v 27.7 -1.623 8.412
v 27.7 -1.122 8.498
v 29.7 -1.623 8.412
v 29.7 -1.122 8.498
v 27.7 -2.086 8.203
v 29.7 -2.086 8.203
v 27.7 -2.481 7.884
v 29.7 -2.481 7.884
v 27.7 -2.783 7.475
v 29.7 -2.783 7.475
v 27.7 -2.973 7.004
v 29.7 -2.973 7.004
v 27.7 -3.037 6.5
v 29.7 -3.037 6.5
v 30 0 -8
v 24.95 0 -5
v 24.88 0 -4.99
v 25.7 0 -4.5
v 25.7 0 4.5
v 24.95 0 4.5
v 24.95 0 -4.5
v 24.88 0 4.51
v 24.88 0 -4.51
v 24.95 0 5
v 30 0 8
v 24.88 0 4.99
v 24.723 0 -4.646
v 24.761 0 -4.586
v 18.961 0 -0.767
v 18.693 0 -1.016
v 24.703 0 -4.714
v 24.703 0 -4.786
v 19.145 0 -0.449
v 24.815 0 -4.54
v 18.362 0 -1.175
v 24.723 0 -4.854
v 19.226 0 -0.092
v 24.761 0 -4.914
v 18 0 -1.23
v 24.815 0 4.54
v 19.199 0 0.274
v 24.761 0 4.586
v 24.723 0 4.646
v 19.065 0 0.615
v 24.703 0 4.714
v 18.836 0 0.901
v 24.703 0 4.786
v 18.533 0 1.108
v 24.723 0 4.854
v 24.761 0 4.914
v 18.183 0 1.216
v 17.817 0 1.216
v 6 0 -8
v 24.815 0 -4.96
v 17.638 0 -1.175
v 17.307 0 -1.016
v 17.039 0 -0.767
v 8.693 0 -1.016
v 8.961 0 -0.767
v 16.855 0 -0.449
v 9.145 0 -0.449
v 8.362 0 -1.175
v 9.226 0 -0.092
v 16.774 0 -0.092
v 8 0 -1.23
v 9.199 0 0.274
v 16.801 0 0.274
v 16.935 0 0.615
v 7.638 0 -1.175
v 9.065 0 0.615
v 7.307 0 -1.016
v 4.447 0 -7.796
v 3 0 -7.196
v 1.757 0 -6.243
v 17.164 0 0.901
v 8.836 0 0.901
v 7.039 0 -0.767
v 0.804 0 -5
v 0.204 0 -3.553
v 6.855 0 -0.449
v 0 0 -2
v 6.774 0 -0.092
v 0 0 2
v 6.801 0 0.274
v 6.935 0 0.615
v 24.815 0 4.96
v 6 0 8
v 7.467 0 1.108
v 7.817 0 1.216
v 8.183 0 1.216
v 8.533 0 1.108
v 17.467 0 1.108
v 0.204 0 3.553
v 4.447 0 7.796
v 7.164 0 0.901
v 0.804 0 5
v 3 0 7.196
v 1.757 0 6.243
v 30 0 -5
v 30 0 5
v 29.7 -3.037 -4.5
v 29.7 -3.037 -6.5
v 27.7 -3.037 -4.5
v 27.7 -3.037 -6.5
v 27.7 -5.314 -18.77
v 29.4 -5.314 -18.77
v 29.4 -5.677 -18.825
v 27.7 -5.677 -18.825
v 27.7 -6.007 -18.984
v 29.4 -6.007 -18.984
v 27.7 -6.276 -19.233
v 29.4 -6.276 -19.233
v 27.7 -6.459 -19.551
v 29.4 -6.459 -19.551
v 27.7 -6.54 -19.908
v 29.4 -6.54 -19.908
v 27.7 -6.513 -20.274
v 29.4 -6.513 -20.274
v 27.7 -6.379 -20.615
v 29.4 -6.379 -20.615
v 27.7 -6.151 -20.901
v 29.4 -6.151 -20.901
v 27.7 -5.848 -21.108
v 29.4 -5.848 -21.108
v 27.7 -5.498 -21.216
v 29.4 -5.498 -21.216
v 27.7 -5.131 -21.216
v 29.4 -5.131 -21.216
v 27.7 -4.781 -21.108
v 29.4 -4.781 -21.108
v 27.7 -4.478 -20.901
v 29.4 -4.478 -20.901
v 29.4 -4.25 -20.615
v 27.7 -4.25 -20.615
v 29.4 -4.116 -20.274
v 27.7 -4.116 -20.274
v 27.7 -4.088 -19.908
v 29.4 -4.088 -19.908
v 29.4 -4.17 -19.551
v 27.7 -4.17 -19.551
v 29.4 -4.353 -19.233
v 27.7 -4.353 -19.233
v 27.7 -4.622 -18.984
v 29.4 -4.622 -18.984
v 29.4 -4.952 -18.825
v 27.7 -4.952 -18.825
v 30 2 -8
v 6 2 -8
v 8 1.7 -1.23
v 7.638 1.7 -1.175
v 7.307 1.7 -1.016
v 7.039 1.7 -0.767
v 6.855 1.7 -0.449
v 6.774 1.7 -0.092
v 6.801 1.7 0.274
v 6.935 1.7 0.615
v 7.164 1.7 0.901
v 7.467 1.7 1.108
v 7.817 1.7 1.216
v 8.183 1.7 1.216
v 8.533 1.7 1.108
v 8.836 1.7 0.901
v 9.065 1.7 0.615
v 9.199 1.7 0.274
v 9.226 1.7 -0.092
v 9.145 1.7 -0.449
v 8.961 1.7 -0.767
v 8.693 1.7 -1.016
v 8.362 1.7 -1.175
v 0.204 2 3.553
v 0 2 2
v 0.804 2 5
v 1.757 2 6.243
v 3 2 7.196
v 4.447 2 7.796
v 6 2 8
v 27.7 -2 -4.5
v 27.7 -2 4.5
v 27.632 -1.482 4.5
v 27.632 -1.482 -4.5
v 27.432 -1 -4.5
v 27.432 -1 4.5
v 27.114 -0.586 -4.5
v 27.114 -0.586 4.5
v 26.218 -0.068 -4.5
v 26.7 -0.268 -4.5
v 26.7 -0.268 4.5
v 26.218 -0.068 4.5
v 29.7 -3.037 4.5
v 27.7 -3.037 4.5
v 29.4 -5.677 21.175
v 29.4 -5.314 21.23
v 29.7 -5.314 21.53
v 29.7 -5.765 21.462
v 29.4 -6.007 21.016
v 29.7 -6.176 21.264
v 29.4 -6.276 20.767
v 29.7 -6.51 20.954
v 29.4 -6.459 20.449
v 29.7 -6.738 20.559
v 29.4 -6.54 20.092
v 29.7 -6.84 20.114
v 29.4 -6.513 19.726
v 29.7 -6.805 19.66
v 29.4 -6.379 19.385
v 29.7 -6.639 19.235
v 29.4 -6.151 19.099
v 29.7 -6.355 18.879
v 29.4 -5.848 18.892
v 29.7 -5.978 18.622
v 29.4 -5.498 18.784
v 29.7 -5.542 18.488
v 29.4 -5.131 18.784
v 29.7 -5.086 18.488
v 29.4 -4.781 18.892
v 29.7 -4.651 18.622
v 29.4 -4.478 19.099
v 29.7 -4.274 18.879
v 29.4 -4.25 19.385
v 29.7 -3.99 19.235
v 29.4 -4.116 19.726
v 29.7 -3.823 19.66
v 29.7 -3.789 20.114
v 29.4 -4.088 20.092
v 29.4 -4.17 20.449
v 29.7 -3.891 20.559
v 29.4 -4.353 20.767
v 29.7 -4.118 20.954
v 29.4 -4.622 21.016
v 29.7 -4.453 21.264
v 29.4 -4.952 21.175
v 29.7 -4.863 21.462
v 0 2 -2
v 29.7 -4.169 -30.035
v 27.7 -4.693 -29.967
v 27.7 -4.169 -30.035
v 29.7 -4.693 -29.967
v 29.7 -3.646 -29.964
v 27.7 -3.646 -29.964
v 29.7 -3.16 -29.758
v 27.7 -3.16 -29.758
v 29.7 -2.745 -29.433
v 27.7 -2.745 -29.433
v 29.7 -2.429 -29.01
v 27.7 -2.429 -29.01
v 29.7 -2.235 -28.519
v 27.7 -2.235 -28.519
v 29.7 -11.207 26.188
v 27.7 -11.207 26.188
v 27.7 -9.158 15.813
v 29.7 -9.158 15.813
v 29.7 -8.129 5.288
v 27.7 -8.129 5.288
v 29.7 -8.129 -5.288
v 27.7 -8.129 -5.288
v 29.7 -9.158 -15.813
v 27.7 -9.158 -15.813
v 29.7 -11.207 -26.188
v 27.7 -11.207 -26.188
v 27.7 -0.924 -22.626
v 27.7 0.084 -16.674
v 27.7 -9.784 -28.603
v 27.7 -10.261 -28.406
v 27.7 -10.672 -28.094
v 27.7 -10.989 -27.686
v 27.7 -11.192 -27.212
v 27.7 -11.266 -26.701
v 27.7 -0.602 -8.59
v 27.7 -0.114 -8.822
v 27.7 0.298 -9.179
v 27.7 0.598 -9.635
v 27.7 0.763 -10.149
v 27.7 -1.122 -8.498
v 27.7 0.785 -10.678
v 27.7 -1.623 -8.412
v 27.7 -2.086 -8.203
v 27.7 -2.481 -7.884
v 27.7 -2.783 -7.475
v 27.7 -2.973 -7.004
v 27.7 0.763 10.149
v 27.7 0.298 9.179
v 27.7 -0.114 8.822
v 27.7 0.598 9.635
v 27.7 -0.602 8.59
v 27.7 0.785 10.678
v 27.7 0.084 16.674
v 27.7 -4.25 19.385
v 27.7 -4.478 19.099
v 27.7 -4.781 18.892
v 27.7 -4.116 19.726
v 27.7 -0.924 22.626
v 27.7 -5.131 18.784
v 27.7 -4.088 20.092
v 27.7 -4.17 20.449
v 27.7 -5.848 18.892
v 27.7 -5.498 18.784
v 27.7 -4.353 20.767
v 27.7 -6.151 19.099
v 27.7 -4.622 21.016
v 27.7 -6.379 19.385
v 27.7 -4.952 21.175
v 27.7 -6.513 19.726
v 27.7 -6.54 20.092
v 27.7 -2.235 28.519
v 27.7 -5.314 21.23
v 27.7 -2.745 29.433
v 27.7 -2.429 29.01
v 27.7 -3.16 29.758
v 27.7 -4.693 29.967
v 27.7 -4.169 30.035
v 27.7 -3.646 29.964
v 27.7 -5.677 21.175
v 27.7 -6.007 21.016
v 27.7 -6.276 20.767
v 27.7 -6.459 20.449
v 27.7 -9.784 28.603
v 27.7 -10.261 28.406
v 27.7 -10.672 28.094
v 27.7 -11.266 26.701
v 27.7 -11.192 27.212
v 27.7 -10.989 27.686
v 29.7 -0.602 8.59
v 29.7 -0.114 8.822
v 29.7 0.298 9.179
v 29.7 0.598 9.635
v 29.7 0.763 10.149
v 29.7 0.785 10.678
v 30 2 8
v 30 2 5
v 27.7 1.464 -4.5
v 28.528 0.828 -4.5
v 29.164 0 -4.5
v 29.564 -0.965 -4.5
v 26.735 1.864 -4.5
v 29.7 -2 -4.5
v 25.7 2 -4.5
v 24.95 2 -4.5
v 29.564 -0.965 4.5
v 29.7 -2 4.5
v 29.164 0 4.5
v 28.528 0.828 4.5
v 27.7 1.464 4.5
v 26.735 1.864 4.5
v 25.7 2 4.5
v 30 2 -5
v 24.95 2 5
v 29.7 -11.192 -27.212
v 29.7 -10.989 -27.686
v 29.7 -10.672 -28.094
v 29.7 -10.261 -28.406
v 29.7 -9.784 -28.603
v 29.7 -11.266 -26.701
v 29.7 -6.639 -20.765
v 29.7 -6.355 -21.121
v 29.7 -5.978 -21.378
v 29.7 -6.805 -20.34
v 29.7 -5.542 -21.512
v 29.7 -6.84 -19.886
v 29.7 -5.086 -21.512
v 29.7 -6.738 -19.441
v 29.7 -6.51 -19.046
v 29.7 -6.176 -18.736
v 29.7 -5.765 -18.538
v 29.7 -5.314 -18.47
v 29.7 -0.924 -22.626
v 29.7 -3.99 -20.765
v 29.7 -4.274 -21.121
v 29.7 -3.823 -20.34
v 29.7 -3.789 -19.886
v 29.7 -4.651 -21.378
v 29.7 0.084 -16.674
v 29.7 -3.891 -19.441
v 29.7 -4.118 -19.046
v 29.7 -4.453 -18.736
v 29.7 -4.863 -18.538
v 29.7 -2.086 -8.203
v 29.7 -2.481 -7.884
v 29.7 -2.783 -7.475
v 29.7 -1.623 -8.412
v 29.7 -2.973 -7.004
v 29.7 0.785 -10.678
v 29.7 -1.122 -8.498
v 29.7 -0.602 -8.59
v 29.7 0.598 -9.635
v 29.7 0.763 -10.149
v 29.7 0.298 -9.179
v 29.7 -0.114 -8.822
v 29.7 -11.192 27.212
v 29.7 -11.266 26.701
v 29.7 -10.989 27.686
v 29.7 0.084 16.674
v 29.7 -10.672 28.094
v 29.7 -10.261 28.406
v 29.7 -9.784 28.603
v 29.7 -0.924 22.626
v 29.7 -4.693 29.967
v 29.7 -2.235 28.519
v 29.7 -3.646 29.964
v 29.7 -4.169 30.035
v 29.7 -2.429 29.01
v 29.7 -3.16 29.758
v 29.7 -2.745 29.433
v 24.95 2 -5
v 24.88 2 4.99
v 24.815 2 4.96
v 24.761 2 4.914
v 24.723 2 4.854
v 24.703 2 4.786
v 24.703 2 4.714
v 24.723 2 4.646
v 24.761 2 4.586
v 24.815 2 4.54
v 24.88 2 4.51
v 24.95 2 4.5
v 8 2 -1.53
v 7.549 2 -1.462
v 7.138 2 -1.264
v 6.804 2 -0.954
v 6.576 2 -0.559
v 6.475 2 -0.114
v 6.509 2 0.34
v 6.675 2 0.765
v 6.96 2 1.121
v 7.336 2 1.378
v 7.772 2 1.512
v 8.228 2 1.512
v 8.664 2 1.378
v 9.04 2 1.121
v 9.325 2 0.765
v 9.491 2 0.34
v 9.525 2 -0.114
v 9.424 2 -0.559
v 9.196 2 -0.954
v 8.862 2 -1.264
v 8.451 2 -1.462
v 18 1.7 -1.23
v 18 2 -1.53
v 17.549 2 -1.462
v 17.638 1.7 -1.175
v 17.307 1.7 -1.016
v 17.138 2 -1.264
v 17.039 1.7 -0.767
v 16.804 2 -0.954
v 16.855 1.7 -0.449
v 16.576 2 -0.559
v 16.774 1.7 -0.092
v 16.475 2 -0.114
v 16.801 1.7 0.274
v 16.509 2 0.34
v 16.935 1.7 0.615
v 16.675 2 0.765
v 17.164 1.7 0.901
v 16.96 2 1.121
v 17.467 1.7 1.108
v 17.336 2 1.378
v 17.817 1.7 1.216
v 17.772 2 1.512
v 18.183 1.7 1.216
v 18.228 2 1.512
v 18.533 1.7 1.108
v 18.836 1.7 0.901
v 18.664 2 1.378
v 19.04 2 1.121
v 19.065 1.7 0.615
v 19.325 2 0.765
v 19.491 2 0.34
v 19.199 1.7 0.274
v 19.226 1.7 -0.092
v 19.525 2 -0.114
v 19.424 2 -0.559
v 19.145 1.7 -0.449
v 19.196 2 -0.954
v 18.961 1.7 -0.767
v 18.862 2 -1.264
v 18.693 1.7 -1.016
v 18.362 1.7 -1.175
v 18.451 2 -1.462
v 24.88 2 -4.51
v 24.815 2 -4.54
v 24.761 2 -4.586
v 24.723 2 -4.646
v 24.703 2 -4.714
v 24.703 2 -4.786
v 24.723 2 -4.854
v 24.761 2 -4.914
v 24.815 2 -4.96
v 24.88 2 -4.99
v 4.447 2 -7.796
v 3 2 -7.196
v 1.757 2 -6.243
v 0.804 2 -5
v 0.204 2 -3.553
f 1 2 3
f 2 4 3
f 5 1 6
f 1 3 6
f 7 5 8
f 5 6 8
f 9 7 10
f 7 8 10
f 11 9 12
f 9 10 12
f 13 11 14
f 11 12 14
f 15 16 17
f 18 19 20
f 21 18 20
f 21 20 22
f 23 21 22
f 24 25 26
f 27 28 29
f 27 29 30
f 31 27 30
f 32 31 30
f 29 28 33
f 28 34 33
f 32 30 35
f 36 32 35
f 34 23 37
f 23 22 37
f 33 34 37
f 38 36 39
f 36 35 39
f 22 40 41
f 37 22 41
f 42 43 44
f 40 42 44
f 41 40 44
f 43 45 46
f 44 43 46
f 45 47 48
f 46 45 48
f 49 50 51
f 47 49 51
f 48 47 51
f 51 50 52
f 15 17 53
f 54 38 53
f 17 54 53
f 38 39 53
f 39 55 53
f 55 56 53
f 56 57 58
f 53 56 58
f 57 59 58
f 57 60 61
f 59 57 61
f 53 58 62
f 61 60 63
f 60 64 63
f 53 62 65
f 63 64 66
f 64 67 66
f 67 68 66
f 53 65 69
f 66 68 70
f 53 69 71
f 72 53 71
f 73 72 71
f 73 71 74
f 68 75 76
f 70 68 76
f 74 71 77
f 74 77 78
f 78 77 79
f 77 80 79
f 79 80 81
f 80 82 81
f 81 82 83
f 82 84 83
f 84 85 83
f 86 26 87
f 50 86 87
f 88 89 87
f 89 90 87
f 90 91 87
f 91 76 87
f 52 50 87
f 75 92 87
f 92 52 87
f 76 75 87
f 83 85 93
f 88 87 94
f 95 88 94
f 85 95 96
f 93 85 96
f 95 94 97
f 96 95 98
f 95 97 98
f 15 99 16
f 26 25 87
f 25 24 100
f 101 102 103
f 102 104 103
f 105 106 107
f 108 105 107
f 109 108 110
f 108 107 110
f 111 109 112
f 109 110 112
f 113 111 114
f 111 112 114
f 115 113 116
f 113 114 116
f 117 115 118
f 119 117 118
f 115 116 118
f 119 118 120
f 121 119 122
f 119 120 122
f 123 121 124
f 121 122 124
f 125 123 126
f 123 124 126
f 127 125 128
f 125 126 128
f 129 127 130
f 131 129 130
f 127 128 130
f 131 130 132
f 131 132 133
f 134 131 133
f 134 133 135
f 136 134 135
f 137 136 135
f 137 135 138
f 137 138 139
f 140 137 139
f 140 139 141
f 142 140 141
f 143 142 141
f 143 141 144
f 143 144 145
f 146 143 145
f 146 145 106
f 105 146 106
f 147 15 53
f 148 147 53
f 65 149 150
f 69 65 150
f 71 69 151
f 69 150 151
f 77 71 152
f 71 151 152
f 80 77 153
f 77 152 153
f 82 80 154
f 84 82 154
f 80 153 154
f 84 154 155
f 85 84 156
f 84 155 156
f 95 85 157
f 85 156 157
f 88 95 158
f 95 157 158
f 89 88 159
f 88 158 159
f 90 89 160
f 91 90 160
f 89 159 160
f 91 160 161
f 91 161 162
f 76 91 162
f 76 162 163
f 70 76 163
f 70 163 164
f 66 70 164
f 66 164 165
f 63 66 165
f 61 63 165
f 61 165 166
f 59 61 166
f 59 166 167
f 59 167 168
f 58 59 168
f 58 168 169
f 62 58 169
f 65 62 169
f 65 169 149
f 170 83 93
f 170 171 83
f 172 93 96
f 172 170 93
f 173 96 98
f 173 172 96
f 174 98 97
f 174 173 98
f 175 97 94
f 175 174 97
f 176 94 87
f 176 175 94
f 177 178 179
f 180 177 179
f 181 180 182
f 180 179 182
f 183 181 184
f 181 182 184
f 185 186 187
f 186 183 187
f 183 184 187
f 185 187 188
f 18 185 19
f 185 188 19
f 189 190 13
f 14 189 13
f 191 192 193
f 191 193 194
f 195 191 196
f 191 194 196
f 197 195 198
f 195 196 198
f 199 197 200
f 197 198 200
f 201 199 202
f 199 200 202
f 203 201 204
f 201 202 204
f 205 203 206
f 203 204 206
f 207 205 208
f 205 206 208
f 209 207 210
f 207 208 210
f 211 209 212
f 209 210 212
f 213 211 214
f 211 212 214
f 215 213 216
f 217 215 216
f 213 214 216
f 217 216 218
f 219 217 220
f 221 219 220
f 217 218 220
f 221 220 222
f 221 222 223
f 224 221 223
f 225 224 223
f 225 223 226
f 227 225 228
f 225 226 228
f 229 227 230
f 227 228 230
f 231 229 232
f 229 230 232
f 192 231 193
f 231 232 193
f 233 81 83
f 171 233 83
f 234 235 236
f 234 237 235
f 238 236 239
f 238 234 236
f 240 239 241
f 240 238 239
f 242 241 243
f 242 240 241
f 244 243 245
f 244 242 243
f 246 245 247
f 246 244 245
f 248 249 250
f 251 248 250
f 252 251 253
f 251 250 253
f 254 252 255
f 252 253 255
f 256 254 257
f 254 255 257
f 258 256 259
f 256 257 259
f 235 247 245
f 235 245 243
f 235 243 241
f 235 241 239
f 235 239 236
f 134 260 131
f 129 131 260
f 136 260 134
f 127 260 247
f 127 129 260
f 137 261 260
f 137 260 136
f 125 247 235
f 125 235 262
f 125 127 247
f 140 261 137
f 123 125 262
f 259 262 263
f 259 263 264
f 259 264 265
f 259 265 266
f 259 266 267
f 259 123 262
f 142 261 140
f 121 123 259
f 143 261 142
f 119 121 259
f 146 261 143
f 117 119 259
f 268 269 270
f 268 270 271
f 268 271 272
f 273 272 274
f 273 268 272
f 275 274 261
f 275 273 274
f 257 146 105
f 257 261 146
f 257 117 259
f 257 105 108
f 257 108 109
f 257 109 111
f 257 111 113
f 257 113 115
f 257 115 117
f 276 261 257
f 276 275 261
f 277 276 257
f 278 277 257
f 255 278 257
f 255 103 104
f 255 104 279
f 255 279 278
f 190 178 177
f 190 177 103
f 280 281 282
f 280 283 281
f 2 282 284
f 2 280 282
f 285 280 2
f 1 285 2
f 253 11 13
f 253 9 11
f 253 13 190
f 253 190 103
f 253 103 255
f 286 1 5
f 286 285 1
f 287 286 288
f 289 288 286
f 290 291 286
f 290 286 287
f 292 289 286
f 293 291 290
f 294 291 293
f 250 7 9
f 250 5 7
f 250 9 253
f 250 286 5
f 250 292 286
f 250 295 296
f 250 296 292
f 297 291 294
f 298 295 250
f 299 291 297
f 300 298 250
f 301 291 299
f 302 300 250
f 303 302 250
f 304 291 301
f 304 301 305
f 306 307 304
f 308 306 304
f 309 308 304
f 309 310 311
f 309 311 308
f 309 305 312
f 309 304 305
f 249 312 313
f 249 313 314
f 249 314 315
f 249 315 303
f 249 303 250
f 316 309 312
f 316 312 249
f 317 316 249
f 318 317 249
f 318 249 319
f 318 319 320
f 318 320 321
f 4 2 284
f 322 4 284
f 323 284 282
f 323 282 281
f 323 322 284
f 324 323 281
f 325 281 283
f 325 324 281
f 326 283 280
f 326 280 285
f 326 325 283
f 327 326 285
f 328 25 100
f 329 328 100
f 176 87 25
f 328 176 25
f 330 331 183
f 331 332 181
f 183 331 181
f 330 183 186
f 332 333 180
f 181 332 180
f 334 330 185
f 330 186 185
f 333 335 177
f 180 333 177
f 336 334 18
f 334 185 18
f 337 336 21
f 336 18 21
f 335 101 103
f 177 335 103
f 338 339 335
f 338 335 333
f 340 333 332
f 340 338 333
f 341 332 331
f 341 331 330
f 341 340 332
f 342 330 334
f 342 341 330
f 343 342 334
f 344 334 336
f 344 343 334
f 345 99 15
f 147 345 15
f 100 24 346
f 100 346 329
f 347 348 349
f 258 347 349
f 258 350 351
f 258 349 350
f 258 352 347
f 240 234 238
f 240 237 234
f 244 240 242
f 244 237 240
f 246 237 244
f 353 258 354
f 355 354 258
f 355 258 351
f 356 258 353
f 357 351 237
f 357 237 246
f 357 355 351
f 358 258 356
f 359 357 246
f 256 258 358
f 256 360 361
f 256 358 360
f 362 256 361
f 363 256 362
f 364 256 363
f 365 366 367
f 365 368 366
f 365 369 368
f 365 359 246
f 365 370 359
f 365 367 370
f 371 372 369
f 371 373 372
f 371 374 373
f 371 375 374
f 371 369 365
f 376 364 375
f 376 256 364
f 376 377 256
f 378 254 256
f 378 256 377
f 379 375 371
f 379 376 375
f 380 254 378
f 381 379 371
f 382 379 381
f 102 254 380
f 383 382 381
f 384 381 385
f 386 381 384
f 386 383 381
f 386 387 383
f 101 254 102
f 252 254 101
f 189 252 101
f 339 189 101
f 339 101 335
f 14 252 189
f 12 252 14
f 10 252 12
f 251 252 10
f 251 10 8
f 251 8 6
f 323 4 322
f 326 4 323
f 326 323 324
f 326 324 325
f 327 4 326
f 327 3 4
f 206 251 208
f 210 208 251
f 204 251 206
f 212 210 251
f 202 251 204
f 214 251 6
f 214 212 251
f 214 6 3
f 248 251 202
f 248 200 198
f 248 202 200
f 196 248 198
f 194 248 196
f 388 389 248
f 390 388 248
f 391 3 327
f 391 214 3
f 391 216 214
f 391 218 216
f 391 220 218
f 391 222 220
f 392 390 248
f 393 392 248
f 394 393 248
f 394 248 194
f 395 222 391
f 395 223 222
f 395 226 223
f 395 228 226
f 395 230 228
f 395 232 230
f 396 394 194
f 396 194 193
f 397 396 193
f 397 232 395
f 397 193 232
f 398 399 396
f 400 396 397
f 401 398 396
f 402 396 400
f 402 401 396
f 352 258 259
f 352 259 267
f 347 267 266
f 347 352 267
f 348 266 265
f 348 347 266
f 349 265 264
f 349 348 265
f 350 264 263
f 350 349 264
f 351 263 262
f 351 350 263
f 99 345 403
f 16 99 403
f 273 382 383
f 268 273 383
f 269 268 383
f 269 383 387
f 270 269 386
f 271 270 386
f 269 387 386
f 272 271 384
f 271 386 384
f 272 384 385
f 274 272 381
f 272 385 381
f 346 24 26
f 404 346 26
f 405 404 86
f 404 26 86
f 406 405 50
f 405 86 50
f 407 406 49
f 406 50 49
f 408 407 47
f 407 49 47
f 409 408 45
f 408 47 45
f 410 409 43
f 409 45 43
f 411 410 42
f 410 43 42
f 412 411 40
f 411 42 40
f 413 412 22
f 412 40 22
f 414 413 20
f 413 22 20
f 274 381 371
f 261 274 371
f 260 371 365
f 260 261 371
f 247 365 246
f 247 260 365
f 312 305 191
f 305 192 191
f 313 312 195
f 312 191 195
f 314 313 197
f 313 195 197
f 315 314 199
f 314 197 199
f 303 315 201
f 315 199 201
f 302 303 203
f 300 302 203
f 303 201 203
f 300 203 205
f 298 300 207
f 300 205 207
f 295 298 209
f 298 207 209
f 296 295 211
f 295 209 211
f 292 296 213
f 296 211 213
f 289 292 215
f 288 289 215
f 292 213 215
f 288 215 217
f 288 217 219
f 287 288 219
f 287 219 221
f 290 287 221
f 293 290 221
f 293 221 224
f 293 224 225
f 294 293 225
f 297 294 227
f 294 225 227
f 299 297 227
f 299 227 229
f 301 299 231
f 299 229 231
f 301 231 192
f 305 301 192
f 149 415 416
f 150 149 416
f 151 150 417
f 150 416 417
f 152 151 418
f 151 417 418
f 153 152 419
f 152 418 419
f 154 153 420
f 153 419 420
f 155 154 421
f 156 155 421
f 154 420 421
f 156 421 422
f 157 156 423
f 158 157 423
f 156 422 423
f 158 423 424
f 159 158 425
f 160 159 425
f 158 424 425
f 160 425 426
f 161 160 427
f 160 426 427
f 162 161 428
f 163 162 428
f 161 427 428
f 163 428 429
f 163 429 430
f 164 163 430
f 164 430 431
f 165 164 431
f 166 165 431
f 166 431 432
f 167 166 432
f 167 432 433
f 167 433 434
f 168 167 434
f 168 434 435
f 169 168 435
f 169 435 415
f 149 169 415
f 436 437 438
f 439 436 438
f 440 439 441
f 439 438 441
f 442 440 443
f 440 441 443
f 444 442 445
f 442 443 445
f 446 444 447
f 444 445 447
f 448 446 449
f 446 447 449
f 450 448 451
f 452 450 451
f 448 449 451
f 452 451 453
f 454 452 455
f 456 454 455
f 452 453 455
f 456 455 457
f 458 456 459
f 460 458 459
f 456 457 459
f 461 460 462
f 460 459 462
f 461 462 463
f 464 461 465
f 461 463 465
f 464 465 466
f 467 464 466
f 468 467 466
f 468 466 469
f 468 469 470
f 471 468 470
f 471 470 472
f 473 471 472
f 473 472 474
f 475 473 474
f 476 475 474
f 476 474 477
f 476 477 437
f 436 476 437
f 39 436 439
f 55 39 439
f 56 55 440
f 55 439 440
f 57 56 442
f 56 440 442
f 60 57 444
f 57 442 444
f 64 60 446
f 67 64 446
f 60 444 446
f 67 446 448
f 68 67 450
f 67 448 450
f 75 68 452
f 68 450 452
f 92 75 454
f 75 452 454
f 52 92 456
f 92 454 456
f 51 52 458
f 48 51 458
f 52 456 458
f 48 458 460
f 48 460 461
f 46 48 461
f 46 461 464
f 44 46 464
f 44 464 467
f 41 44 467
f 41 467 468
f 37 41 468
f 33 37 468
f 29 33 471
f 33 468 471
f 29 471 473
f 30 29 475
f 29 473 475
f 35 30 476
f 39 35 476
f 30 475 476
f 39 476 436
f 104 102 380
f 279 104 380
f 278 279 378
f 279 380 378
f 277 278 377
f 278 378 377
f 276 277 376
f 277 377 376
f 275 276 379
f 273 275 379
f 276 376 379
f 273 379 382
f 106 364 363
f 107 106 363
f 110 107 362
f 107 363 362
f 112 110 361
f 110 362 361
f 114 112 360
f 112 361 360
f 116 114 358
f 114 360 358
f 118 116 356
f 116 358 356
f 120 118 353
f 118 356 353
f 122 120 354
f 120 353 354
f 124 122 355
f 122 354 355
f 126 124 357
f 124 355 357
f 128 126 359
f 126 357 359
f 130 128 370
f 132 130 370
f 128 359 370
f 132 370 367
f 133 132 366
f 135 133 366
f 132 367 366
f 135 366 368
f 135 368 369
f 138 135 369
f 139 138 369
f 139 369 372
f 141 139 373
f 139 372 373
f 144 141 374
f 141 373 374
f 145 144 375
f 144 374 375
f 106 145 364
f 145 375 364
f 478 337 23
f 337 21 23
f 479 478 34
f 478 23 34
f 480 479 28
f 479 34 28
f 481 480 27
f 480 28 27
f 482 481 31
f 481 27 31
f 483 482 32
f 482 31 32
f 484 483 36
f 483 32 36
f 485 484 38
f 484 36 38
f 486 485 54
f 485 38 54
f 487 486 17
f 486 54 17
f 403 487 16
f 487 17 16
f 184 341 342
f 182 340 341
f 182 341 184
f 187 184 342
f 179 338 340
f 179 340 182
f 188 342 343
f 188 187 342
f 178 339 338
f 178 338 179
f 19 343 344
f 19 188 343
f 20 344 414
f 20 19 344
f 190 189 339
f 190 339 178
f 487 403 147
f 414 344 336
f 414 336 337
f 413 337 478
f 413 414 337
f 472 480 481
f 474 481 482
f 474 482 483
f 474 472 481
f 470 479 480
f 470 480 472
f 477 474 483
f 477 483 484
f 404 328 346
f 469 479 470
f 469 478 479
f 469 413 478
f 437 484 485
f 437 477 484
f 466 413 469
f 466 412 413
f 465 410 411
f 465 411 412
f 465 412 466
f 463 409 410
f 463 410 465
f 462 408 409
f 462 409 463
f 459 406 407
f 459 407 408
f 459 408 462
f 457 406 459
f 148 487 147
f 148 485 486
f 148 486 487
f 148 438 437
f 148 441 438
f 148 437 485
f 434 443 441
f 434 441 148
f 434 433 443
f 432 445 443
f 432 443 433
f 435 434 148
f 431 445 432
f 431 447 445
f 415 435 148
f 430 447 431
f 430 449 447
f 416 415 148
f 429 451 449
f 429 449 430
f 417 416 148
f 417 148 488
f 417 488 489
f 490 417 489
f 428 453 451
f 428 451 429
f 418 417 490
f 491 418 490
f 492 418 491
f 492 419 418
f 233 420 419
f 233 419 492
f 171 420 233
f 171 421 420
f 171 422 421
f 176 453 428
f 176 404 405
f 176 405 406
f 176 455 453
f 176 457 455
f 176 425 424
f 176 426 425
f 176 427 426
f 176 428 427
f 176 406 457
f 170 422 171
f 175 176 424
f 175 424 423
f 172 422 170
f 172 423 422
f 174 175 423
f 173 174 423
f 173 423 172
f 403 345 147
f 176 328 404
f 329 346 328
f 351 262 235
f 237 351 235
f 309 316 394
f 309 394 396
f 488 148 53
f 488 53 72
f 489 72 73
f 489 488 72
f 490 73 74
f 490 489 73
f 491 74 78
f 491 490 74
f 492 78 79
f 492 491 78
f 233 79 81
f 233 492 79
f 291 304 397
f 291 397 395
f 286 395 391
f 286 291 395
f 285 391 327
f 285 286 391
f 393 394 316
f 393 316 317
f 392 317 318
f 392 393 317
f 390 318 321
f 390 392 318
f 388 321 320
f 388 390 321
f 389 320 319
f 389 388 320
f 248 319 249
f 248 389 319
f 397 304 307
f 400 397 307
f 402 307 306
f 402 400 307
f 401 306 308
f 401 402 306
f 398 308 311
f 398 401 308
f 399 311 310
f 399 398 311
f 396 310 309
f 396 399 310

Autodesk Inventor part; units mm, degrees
ref_plane "YZ Plane" through (0, 0, 0) normal (1, 0, 0) x (0, 1, 0)
ref_plane "XZ Plane" through (0, 0, 0) normal (0, 1, 0) x (-1, 0, 0)
ref_plane "XY Plane" through (0, 0, 0) normal (0, 0, 1) x (1, 0, 0)
sketch "Szkic1" plane through (0, 0, 0) normal (0, 1, 0) x (-1, 0, 0)
  line L0 (0, 8) -> (-30, 8)
  line L1 (-30, 8) -> (-30, -8)
  line L2 (-30, -8) -> (0, -8)
  line L3 (0, -8) -> (0, 8)
  point P0 (0, 0)
  dimension "d0" = 30
  dimension "d1" = 16
  dimension "d18" = 8
extrude "Płyta1" add sketch "Szkic1" along normal blind 2
sketch "Szkic2" plane through (0, 2, 0) normal (0, 1, 0) x (1, 0, 0)
  line L0 (30, -8) -> (30, 8) projected
  line L1 (30, 5) -> (29.7, 5)
  line L2 (29.7, 5) -> (29.7, -5)
  line L3 (29.7, -5) -> (30, -5)
  line L4 (30, -5) -> (30, 5)
  line L5 (0, 8) -> (30, 8) projected
  point P0 (0, 0)
  dimension "d3" = 10
  dimension "d4" = 3
  dimension "d5" = 0.3
extrude "Wyciągnięcie proste1" cut sketch "Szkic2" against normal up to next
sketch "Szkic3" plane through (27.7, 2, -5) normal (1, 0, 0) x (0, -1, 0)
  line L0 (0, 9.5) -> (0, 0.5)
  line L1 (0, 0.5) -> (10, 0.5)
  line L2 (10, 0.5) -> (10, 9.5)
  line L3 (10, 9.5) -> (0, 9.5)
edge flange "Kołnierz1" height 10 angle 90 thickness 2 bend radius 2 thickness toward (1, 0, 0) relief round relief width 0.5 relief depth 1 edges at (29.7, 2, 0) wall of the first edge with corners at (27.7, 2, 4.5) (27.7, 2, -4.5) (27.7, -8, -4.5) (27.7, -8, 4.5)
bend "Zagięcie1"
corner "Narożnik1"
sketch "Szkic5" plane through (27.7, -8, -4.5) normal (-1, 0, 0) x (0, 0, 1)
  line L0 (9, 0) -> (0, 0)
  arc A0 (32.5897, -3.6981) -> (-23.5897, -3.6981) centre (4.5, -108.5303) ccw
  line L1 (9.5, 10) -> (12.5, 10)
  line L2 (32.5897, -3.6981) -> (34.9889, 5.2557)
  line L3 (-23.5897, -3.6981) -> (-25.9889, 5.2557)
  line L4 (0, 6) -> (9, 6)
  arc A1 (34.9889, 5.2557) -> (13, 8.9626) centre (4.5, -108.5303) ccw
  arc A2 (-4, 8.9626) -> (-25.9889, 5.2557) centre (4.5, -108.5303) ccw
  line L5 (-4, 8.9626) -> (-4, 4.9626)
  line L6 (-4, 4.9626) -> (13, 4.9626)
  line L7 (13, 4.9626) -> (13, 8.9626)
  circle A3 centre (4.5, -108.5303) radius 113
  line L8 (4.5, 0) -> (4.5, -108.5303)
  point P0 (4.5, 8)
  dimension "d38" = 4
  dimension "d39" = 17
  dimension "d42" = 226
  dimension "d69" = 108.5303
sheet face with bend "Powierzchnia2" sketch "Szkic5" thickness 2 toward (1, 0, 0) bend radius 2 picked at (25.4474, 0.8245) contours A0 L3 A3 L2 | A3 L3 A2 L5 L6 L7 A1 L2
bend "Zagięcie2"
fillet "Zaokrąglenie narożnika1" radius 2 8 edges at (28.7, 0.9626, -8.5) (28.7, -11.6981, -28.0897) (28.7, -11.6981, 28.0897) (28.7, -3.0374, -8.5) (28.7, -2.7443, 30.4889) (28.7, 0.9626, 8.5) (28.7, -3.0374, 8.5) (28.7, -2.7443, -30.4889)
fillet "Zaokrąglenie narożnika2" radius 6 2 edges at (0, 1, 8) (0, 1, -8)
sketch "Szkic6" plane through (27.7, -2, -4.5) normal (-1, 0, 0) x (0, 0, 1)
  point P0 (4.5, 2)
sketch "Szkic7" plane through (27.7, -2, -4.5) normal (-1, 0, 0) x (0, 0, 1)
  line L0 (9, 0) -> (0, 0) projected
  line L1 (4.5, 0) -> (4.5, -9.6943)
  arc A0 (30.6882, -9.207) -> (-21.6882, -9.207) centre (4.5, -114.5303) ccw projected
  line L2 (4.5, -6) -> (4.5, -114.5303)
  circle A1 centre (4.5, -114.5303) radius 113
  point P0 (4.5, 2)
  point P1 (24.5, -3.3143)
  point P2 (-15.5, -3.3143)
  dimension "d49" = 20
  dimension "d50" = 20
  dimension "d70" = 108.5303
  dimension "d71" = 226
hole "Otwór1" at (27.7, -5.3143, -20) at (27.7, -5.3143, 20) direction (1, 0, 0) diameter 2.459 end through all thread size "M3x0.5" class "6H" standard "ANSI Metric M Profile"
sketch "Szkic8" plane through (0, 0, 0) normal (0, -1, 0) x (1, 0, 0)
  line L0 (30, 5) -> (30, 8) projected
  point P0 (0, 0)
  point P1 (8, 0)
  point P2 (18, 0)
  dimension "d60" = 8
  dimension "d61" = 10
  dimension "d75" = 12
hole "Otwór2" at (8, 0, 0) at (18, 0, 0) direction (0, 1, 0) diameter 2.459 end through all thread size "M3x0.5" class "6H" standard "ANSI Metric M Profile"
chamfer "Faza1" distance 0.3 angle 45 4 edges at (29.7, -5.3143, -21.2295) (29.7, -5.3143, 18.7705) (8, 2, 1.2295) (18, 2, 1.2295)
equation "\"d2\" = Grubość"
equation "\"d9\" = GłębokośćGięciaPodcięcia"
equation "\"d10\" = MinimalnaPozostałość"
equation "\"d11\" = PromieńPrzejścia"
equation "\"d14\" = PromieńGięcia"
equation "\"d15\" = RozmiarPodcięciaNarożnika"
equation "\"d16\" = Wielk_odstępu"
equation "\"d17\" = Rozmiar_promienia_Jacobiego"
equation "\"d31\" = PromieńGięcia"
equation "\"d32\" = SzerokośćGięciaPodcięcia"
equation "\"d34\" = MinimalnaPozostałość"
equation "\"d33\" = GłębokośćGięciaPodcięcia"
equation "\"d35\" = PromieńPrzejścia"
equation "\"PromieńGięcia\" = Grubość"
equation "\"SzerokośćGięciaPodcięcia\" = Grubość"
equation "\"GłębokośćGięciaPodcięcia\" = 0.5 * Grubość"
equation "\"RozmiarPodcięciaNarożnika\" = 4 * Grubość"
equation "\"MinimalnaPozostałość\" = 2 * Grubość"
equation "\"PromieńPrzejścia\" = PromieńGięcia"
equation "\"Rozmiar_promienia_Jacobiego\" = PromieńGięcia"
equation "\"Wielk_odstępu\" = Grubość"
equation "\"Grubość\" = 2"
properties part number "NowyKatownik" material "Stal nierdzewna"
